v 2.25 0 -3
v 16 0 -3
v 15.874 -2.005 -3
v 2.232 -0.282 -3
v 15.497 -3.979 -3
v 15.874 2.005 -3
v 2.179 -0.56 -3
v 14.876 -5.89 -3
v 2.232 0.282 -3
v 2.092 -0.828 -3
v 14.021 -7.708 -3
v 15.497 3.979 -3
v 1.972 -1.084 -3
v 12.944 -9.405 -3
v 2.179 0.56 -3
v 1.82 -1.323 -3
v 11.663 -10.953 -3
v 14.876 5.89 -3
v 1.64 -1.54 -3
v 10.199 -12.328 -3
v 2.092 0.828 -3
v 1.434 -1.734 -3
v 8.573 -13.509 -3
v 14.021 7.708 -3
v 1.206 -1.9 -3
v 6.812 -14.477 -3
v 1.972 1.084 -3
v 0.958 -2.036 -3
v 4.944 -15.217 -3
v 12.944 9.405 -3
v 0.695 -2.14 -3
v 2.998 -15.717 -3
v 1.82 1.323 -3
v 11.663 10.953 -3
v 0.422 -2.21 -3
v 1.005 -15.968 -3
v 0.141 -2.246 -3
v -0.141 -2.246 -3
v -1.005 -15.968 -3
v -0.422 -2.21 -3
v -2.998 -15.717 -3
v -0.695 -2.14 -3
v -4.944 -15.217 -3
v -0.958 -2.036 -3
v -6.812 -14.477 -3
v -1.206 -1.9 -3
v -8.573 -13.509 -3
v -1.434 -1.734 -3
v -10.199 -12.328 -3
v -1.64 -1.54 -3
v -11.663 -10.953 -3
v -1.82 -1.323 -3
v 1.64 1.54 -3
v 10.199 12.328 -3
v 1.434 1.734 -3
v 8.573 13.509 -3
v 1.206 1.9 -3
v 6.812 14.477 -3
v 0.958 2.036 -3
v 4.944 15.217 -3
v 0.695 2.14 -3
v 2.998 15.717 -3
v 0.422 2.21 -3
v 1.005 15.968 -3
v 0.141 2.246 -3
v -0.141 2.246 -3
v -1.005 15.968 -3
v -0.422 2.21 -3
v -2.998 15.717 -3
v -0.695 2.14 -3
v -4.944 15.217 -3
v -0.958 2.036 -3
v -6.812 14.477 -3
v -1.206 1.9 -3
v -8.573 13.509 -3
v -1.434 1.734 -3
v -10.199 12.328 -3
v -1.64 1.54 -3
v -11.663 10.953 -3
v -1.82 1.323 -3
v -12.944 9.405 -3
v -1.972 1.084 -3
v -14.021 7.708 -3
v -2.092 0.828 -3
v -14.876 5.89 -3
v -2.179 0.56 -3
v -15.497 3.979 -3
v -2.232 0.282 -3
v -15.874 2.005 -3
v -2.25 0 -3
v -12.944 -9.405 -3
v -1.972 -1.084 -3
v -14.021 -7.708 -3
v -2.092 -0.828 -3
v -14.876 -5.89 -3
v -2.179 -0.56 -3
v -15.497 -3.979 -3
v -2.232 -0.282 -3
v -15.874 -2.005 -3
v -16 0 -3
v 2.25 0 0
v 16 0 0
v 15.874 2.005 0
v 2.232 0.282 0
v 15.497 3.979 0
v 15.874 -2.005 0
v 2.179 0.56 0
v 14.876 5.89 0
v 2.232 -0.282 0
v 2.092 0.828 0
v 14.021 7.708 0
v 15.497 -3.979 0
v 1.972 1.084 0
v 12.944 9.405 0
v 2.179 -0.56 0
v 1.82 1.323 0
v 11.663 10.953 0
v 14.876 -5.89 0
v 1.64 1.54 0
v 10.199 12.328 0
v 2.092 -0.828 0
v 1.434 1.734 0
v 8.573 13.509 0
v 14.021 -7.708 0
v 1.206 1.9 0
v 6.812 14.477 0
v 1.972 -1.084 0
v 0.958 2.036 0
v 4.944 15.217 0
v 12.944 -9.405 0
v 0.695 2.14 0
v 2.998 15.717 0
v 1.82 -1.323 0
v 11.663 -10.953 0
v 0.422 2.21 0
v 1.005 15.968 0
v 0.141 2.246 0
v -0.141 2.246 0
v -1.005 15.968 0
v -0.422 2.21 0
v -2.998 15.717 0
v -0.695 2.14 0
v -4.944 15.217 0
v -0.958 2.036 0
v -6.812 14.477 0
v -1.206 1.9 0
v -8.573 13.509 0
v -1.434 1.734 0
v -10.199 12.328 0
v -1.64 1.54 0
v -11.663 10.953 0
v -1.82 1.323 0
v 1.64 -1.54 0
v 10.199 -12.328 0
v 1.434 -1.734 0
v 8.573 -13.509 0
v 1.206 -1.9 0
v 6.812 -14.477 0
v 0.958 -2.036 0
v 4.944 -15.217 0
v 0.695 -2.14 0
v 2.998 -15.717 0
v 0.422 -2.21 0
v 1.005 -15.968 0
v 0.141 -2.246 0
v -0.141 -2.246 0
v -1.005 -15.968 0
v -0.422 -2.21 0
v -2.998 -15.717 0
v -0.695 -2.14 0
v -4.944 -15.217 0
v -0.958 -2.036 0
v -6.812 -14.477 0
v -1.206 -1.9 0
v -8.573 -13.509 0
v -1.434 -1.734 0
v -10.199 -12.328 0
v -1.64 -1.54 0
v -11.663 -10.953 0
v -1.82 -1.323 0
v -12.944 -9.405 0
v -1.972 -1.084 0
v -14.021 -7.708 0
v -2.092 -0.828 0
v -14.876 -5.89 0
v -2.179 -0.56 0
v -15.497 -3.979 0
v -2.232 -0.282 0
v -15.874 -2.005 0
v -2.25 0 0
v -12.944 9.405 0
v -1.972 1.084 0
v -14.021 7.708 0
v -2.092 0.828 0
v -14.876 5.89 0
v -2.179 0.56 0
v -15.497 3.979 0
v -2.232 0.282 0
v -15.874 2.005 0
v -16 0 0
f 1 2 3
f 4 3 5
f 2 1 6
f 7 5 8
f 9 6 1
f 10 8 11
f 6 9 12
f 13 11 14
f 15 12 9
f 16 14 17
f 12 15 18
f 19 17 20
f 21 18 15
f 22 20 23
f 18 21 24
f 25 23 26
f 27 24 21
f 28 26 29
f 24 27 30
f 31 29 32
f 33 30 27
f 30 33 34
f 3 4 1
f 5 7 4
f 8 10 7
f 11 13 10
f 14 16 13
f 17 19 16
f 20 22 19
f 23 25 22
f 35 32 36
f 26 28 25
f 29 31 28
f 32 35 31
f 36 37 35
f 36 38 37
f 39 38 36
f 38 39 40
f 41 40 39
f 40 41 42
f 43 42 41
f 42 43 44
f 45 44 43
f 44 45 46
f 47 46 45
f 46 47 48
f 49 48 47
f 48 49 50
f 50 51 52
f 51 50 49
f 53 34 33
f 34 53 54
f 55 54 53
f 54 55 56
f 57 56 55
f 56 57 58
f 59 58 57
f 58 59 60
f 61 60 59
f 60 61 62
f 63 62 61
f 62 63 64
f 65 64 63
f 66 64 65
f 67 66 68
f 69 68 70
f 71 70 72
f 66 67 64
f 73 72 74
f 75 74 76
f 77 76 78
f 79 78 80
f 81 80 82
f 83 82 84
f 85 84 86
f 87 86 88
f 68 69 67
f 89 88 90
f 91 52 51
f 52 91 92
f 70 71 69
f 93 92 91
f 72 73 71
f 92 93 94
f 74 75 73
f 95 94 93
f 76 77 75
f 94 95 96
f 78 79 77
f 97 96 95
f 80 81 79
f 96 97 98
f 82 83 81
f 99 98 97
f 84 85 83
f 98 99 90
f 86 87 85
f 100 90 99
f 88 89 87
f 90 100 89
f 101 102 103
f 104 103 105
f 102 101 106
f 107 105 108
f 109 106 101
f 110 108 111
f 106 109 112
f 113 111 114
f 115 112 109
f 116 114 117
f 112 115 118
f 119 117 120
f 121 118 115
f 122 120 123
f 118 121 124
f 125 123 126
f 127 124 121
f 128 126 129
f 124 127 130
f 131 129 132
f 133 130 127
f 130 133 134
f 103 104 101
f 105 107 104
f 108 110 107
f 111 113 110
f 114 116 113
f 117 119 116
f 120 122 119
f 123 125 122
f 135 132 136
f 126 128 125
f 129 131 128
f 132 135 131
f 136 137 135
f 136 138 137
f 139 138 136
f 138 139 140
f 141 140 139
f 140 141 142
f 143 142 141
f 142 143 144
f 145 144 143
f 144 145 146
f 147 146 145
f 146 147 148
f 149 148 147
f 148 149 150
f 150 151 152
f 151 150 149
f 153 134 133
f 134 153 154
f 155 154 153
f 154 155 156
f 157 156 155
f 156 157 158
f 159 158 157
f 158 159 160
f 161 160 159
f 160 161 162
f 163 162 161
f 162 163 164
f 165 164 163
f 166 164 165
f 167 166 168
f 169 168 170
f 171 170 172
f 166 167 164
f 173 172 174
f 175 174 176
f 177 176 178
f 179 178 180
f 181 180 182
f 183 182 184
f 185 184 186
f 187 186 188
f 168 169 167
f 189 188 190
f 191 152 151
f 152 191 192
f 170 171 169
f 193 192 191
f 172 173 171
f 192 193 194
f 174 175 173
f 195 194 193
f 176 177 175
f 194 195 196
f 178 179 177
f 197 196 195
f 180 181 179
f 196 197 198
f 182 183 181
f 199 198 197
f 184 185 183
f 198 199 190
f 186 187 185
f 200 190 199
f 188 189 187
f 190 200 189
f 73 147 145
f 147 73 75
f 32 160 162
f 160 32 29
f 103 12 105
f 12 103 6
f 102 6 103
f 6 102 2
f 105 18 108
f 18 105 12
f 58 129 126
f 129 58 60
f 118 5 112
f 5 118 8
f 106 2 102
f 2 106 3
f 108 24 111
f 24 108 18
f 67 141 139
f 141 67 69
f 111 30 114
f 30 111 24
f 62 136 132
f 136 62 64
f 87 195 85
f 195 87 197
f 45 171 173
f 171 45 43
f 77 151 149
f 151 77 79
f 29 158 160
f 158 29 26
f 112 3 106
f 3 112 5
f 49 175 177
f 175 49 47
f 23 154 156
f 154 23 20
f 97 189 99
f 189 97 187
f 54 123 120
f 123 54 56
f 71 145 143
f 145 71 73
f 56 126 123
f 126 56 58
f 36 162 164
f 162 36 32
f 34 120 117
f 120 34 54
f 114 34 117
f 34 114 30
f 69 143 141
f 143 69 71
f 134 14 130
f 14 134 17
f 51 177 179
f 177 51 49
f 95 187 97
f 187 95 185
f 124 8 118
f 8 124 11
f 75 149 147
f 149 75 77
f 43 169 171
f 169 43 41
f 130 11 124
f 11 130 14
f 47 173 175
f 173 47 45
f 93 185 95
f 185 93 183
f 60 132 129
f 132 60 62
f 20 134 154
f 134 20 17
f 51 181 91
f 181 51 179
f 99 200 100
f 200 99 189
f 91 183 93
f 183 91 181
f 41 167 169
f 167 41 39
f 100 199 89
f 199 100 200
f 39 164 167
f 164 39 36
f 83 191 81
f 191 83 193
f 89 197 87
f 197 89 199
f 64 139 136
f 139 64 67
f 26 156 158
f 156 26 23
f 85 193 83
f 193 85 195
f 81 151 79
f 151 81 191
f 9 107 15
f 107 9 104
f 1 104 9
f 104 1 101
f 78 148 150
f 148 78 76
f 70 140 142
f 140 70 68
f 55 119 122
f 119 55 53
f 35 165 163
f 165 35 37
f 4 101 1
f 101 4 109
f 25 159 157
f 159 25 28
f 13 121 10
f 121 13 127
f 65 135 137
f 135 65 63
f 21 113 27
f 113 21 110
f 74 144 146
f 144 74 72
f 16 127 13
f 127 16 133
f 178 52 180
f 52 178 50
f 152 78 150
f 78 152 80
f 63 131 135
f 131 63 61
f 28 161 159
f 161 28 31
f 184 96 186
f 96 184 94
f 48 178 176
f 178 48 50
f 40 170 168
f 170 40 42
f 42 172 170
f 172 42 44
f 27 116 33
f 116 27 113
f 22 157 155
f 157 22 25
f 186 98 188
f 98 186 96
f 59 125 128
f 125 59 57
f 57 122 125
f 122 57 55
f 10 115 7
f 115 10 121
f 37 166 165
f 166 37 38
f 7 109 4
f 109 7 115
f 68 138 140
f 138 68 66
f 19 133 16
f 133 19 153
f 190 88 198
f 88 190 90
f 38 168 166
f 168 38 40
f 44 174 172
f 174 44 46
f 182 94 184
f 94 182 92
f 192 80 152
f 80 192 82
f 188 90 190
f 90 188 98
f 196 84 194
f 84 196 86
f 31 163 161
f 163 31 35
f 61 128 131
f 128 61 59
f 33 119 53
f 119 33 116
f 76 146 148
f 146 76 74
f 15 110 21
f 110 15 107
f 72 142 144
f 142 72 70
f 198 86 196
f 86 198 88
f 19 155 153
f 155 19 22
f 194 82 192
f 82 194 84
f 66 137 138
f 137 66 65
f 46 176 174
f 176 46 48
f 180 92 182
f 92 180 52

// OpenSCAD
$fn = 50;


difference() {
	union() {
		translate(v = [0, 0, -3.0000000000]) {
			cylinder(h = 3, r = 10.0000000000);
		}
		translate(v = [0, 0, -3.0000000000]) {
			cylinder(h = 3, r = 16.0000000000);
		}
	}
	union() {
		#translate(v = [0, 0, -3]) {
			cylinder(h = 3, r = 2.2500000000);
		}
	}
}
